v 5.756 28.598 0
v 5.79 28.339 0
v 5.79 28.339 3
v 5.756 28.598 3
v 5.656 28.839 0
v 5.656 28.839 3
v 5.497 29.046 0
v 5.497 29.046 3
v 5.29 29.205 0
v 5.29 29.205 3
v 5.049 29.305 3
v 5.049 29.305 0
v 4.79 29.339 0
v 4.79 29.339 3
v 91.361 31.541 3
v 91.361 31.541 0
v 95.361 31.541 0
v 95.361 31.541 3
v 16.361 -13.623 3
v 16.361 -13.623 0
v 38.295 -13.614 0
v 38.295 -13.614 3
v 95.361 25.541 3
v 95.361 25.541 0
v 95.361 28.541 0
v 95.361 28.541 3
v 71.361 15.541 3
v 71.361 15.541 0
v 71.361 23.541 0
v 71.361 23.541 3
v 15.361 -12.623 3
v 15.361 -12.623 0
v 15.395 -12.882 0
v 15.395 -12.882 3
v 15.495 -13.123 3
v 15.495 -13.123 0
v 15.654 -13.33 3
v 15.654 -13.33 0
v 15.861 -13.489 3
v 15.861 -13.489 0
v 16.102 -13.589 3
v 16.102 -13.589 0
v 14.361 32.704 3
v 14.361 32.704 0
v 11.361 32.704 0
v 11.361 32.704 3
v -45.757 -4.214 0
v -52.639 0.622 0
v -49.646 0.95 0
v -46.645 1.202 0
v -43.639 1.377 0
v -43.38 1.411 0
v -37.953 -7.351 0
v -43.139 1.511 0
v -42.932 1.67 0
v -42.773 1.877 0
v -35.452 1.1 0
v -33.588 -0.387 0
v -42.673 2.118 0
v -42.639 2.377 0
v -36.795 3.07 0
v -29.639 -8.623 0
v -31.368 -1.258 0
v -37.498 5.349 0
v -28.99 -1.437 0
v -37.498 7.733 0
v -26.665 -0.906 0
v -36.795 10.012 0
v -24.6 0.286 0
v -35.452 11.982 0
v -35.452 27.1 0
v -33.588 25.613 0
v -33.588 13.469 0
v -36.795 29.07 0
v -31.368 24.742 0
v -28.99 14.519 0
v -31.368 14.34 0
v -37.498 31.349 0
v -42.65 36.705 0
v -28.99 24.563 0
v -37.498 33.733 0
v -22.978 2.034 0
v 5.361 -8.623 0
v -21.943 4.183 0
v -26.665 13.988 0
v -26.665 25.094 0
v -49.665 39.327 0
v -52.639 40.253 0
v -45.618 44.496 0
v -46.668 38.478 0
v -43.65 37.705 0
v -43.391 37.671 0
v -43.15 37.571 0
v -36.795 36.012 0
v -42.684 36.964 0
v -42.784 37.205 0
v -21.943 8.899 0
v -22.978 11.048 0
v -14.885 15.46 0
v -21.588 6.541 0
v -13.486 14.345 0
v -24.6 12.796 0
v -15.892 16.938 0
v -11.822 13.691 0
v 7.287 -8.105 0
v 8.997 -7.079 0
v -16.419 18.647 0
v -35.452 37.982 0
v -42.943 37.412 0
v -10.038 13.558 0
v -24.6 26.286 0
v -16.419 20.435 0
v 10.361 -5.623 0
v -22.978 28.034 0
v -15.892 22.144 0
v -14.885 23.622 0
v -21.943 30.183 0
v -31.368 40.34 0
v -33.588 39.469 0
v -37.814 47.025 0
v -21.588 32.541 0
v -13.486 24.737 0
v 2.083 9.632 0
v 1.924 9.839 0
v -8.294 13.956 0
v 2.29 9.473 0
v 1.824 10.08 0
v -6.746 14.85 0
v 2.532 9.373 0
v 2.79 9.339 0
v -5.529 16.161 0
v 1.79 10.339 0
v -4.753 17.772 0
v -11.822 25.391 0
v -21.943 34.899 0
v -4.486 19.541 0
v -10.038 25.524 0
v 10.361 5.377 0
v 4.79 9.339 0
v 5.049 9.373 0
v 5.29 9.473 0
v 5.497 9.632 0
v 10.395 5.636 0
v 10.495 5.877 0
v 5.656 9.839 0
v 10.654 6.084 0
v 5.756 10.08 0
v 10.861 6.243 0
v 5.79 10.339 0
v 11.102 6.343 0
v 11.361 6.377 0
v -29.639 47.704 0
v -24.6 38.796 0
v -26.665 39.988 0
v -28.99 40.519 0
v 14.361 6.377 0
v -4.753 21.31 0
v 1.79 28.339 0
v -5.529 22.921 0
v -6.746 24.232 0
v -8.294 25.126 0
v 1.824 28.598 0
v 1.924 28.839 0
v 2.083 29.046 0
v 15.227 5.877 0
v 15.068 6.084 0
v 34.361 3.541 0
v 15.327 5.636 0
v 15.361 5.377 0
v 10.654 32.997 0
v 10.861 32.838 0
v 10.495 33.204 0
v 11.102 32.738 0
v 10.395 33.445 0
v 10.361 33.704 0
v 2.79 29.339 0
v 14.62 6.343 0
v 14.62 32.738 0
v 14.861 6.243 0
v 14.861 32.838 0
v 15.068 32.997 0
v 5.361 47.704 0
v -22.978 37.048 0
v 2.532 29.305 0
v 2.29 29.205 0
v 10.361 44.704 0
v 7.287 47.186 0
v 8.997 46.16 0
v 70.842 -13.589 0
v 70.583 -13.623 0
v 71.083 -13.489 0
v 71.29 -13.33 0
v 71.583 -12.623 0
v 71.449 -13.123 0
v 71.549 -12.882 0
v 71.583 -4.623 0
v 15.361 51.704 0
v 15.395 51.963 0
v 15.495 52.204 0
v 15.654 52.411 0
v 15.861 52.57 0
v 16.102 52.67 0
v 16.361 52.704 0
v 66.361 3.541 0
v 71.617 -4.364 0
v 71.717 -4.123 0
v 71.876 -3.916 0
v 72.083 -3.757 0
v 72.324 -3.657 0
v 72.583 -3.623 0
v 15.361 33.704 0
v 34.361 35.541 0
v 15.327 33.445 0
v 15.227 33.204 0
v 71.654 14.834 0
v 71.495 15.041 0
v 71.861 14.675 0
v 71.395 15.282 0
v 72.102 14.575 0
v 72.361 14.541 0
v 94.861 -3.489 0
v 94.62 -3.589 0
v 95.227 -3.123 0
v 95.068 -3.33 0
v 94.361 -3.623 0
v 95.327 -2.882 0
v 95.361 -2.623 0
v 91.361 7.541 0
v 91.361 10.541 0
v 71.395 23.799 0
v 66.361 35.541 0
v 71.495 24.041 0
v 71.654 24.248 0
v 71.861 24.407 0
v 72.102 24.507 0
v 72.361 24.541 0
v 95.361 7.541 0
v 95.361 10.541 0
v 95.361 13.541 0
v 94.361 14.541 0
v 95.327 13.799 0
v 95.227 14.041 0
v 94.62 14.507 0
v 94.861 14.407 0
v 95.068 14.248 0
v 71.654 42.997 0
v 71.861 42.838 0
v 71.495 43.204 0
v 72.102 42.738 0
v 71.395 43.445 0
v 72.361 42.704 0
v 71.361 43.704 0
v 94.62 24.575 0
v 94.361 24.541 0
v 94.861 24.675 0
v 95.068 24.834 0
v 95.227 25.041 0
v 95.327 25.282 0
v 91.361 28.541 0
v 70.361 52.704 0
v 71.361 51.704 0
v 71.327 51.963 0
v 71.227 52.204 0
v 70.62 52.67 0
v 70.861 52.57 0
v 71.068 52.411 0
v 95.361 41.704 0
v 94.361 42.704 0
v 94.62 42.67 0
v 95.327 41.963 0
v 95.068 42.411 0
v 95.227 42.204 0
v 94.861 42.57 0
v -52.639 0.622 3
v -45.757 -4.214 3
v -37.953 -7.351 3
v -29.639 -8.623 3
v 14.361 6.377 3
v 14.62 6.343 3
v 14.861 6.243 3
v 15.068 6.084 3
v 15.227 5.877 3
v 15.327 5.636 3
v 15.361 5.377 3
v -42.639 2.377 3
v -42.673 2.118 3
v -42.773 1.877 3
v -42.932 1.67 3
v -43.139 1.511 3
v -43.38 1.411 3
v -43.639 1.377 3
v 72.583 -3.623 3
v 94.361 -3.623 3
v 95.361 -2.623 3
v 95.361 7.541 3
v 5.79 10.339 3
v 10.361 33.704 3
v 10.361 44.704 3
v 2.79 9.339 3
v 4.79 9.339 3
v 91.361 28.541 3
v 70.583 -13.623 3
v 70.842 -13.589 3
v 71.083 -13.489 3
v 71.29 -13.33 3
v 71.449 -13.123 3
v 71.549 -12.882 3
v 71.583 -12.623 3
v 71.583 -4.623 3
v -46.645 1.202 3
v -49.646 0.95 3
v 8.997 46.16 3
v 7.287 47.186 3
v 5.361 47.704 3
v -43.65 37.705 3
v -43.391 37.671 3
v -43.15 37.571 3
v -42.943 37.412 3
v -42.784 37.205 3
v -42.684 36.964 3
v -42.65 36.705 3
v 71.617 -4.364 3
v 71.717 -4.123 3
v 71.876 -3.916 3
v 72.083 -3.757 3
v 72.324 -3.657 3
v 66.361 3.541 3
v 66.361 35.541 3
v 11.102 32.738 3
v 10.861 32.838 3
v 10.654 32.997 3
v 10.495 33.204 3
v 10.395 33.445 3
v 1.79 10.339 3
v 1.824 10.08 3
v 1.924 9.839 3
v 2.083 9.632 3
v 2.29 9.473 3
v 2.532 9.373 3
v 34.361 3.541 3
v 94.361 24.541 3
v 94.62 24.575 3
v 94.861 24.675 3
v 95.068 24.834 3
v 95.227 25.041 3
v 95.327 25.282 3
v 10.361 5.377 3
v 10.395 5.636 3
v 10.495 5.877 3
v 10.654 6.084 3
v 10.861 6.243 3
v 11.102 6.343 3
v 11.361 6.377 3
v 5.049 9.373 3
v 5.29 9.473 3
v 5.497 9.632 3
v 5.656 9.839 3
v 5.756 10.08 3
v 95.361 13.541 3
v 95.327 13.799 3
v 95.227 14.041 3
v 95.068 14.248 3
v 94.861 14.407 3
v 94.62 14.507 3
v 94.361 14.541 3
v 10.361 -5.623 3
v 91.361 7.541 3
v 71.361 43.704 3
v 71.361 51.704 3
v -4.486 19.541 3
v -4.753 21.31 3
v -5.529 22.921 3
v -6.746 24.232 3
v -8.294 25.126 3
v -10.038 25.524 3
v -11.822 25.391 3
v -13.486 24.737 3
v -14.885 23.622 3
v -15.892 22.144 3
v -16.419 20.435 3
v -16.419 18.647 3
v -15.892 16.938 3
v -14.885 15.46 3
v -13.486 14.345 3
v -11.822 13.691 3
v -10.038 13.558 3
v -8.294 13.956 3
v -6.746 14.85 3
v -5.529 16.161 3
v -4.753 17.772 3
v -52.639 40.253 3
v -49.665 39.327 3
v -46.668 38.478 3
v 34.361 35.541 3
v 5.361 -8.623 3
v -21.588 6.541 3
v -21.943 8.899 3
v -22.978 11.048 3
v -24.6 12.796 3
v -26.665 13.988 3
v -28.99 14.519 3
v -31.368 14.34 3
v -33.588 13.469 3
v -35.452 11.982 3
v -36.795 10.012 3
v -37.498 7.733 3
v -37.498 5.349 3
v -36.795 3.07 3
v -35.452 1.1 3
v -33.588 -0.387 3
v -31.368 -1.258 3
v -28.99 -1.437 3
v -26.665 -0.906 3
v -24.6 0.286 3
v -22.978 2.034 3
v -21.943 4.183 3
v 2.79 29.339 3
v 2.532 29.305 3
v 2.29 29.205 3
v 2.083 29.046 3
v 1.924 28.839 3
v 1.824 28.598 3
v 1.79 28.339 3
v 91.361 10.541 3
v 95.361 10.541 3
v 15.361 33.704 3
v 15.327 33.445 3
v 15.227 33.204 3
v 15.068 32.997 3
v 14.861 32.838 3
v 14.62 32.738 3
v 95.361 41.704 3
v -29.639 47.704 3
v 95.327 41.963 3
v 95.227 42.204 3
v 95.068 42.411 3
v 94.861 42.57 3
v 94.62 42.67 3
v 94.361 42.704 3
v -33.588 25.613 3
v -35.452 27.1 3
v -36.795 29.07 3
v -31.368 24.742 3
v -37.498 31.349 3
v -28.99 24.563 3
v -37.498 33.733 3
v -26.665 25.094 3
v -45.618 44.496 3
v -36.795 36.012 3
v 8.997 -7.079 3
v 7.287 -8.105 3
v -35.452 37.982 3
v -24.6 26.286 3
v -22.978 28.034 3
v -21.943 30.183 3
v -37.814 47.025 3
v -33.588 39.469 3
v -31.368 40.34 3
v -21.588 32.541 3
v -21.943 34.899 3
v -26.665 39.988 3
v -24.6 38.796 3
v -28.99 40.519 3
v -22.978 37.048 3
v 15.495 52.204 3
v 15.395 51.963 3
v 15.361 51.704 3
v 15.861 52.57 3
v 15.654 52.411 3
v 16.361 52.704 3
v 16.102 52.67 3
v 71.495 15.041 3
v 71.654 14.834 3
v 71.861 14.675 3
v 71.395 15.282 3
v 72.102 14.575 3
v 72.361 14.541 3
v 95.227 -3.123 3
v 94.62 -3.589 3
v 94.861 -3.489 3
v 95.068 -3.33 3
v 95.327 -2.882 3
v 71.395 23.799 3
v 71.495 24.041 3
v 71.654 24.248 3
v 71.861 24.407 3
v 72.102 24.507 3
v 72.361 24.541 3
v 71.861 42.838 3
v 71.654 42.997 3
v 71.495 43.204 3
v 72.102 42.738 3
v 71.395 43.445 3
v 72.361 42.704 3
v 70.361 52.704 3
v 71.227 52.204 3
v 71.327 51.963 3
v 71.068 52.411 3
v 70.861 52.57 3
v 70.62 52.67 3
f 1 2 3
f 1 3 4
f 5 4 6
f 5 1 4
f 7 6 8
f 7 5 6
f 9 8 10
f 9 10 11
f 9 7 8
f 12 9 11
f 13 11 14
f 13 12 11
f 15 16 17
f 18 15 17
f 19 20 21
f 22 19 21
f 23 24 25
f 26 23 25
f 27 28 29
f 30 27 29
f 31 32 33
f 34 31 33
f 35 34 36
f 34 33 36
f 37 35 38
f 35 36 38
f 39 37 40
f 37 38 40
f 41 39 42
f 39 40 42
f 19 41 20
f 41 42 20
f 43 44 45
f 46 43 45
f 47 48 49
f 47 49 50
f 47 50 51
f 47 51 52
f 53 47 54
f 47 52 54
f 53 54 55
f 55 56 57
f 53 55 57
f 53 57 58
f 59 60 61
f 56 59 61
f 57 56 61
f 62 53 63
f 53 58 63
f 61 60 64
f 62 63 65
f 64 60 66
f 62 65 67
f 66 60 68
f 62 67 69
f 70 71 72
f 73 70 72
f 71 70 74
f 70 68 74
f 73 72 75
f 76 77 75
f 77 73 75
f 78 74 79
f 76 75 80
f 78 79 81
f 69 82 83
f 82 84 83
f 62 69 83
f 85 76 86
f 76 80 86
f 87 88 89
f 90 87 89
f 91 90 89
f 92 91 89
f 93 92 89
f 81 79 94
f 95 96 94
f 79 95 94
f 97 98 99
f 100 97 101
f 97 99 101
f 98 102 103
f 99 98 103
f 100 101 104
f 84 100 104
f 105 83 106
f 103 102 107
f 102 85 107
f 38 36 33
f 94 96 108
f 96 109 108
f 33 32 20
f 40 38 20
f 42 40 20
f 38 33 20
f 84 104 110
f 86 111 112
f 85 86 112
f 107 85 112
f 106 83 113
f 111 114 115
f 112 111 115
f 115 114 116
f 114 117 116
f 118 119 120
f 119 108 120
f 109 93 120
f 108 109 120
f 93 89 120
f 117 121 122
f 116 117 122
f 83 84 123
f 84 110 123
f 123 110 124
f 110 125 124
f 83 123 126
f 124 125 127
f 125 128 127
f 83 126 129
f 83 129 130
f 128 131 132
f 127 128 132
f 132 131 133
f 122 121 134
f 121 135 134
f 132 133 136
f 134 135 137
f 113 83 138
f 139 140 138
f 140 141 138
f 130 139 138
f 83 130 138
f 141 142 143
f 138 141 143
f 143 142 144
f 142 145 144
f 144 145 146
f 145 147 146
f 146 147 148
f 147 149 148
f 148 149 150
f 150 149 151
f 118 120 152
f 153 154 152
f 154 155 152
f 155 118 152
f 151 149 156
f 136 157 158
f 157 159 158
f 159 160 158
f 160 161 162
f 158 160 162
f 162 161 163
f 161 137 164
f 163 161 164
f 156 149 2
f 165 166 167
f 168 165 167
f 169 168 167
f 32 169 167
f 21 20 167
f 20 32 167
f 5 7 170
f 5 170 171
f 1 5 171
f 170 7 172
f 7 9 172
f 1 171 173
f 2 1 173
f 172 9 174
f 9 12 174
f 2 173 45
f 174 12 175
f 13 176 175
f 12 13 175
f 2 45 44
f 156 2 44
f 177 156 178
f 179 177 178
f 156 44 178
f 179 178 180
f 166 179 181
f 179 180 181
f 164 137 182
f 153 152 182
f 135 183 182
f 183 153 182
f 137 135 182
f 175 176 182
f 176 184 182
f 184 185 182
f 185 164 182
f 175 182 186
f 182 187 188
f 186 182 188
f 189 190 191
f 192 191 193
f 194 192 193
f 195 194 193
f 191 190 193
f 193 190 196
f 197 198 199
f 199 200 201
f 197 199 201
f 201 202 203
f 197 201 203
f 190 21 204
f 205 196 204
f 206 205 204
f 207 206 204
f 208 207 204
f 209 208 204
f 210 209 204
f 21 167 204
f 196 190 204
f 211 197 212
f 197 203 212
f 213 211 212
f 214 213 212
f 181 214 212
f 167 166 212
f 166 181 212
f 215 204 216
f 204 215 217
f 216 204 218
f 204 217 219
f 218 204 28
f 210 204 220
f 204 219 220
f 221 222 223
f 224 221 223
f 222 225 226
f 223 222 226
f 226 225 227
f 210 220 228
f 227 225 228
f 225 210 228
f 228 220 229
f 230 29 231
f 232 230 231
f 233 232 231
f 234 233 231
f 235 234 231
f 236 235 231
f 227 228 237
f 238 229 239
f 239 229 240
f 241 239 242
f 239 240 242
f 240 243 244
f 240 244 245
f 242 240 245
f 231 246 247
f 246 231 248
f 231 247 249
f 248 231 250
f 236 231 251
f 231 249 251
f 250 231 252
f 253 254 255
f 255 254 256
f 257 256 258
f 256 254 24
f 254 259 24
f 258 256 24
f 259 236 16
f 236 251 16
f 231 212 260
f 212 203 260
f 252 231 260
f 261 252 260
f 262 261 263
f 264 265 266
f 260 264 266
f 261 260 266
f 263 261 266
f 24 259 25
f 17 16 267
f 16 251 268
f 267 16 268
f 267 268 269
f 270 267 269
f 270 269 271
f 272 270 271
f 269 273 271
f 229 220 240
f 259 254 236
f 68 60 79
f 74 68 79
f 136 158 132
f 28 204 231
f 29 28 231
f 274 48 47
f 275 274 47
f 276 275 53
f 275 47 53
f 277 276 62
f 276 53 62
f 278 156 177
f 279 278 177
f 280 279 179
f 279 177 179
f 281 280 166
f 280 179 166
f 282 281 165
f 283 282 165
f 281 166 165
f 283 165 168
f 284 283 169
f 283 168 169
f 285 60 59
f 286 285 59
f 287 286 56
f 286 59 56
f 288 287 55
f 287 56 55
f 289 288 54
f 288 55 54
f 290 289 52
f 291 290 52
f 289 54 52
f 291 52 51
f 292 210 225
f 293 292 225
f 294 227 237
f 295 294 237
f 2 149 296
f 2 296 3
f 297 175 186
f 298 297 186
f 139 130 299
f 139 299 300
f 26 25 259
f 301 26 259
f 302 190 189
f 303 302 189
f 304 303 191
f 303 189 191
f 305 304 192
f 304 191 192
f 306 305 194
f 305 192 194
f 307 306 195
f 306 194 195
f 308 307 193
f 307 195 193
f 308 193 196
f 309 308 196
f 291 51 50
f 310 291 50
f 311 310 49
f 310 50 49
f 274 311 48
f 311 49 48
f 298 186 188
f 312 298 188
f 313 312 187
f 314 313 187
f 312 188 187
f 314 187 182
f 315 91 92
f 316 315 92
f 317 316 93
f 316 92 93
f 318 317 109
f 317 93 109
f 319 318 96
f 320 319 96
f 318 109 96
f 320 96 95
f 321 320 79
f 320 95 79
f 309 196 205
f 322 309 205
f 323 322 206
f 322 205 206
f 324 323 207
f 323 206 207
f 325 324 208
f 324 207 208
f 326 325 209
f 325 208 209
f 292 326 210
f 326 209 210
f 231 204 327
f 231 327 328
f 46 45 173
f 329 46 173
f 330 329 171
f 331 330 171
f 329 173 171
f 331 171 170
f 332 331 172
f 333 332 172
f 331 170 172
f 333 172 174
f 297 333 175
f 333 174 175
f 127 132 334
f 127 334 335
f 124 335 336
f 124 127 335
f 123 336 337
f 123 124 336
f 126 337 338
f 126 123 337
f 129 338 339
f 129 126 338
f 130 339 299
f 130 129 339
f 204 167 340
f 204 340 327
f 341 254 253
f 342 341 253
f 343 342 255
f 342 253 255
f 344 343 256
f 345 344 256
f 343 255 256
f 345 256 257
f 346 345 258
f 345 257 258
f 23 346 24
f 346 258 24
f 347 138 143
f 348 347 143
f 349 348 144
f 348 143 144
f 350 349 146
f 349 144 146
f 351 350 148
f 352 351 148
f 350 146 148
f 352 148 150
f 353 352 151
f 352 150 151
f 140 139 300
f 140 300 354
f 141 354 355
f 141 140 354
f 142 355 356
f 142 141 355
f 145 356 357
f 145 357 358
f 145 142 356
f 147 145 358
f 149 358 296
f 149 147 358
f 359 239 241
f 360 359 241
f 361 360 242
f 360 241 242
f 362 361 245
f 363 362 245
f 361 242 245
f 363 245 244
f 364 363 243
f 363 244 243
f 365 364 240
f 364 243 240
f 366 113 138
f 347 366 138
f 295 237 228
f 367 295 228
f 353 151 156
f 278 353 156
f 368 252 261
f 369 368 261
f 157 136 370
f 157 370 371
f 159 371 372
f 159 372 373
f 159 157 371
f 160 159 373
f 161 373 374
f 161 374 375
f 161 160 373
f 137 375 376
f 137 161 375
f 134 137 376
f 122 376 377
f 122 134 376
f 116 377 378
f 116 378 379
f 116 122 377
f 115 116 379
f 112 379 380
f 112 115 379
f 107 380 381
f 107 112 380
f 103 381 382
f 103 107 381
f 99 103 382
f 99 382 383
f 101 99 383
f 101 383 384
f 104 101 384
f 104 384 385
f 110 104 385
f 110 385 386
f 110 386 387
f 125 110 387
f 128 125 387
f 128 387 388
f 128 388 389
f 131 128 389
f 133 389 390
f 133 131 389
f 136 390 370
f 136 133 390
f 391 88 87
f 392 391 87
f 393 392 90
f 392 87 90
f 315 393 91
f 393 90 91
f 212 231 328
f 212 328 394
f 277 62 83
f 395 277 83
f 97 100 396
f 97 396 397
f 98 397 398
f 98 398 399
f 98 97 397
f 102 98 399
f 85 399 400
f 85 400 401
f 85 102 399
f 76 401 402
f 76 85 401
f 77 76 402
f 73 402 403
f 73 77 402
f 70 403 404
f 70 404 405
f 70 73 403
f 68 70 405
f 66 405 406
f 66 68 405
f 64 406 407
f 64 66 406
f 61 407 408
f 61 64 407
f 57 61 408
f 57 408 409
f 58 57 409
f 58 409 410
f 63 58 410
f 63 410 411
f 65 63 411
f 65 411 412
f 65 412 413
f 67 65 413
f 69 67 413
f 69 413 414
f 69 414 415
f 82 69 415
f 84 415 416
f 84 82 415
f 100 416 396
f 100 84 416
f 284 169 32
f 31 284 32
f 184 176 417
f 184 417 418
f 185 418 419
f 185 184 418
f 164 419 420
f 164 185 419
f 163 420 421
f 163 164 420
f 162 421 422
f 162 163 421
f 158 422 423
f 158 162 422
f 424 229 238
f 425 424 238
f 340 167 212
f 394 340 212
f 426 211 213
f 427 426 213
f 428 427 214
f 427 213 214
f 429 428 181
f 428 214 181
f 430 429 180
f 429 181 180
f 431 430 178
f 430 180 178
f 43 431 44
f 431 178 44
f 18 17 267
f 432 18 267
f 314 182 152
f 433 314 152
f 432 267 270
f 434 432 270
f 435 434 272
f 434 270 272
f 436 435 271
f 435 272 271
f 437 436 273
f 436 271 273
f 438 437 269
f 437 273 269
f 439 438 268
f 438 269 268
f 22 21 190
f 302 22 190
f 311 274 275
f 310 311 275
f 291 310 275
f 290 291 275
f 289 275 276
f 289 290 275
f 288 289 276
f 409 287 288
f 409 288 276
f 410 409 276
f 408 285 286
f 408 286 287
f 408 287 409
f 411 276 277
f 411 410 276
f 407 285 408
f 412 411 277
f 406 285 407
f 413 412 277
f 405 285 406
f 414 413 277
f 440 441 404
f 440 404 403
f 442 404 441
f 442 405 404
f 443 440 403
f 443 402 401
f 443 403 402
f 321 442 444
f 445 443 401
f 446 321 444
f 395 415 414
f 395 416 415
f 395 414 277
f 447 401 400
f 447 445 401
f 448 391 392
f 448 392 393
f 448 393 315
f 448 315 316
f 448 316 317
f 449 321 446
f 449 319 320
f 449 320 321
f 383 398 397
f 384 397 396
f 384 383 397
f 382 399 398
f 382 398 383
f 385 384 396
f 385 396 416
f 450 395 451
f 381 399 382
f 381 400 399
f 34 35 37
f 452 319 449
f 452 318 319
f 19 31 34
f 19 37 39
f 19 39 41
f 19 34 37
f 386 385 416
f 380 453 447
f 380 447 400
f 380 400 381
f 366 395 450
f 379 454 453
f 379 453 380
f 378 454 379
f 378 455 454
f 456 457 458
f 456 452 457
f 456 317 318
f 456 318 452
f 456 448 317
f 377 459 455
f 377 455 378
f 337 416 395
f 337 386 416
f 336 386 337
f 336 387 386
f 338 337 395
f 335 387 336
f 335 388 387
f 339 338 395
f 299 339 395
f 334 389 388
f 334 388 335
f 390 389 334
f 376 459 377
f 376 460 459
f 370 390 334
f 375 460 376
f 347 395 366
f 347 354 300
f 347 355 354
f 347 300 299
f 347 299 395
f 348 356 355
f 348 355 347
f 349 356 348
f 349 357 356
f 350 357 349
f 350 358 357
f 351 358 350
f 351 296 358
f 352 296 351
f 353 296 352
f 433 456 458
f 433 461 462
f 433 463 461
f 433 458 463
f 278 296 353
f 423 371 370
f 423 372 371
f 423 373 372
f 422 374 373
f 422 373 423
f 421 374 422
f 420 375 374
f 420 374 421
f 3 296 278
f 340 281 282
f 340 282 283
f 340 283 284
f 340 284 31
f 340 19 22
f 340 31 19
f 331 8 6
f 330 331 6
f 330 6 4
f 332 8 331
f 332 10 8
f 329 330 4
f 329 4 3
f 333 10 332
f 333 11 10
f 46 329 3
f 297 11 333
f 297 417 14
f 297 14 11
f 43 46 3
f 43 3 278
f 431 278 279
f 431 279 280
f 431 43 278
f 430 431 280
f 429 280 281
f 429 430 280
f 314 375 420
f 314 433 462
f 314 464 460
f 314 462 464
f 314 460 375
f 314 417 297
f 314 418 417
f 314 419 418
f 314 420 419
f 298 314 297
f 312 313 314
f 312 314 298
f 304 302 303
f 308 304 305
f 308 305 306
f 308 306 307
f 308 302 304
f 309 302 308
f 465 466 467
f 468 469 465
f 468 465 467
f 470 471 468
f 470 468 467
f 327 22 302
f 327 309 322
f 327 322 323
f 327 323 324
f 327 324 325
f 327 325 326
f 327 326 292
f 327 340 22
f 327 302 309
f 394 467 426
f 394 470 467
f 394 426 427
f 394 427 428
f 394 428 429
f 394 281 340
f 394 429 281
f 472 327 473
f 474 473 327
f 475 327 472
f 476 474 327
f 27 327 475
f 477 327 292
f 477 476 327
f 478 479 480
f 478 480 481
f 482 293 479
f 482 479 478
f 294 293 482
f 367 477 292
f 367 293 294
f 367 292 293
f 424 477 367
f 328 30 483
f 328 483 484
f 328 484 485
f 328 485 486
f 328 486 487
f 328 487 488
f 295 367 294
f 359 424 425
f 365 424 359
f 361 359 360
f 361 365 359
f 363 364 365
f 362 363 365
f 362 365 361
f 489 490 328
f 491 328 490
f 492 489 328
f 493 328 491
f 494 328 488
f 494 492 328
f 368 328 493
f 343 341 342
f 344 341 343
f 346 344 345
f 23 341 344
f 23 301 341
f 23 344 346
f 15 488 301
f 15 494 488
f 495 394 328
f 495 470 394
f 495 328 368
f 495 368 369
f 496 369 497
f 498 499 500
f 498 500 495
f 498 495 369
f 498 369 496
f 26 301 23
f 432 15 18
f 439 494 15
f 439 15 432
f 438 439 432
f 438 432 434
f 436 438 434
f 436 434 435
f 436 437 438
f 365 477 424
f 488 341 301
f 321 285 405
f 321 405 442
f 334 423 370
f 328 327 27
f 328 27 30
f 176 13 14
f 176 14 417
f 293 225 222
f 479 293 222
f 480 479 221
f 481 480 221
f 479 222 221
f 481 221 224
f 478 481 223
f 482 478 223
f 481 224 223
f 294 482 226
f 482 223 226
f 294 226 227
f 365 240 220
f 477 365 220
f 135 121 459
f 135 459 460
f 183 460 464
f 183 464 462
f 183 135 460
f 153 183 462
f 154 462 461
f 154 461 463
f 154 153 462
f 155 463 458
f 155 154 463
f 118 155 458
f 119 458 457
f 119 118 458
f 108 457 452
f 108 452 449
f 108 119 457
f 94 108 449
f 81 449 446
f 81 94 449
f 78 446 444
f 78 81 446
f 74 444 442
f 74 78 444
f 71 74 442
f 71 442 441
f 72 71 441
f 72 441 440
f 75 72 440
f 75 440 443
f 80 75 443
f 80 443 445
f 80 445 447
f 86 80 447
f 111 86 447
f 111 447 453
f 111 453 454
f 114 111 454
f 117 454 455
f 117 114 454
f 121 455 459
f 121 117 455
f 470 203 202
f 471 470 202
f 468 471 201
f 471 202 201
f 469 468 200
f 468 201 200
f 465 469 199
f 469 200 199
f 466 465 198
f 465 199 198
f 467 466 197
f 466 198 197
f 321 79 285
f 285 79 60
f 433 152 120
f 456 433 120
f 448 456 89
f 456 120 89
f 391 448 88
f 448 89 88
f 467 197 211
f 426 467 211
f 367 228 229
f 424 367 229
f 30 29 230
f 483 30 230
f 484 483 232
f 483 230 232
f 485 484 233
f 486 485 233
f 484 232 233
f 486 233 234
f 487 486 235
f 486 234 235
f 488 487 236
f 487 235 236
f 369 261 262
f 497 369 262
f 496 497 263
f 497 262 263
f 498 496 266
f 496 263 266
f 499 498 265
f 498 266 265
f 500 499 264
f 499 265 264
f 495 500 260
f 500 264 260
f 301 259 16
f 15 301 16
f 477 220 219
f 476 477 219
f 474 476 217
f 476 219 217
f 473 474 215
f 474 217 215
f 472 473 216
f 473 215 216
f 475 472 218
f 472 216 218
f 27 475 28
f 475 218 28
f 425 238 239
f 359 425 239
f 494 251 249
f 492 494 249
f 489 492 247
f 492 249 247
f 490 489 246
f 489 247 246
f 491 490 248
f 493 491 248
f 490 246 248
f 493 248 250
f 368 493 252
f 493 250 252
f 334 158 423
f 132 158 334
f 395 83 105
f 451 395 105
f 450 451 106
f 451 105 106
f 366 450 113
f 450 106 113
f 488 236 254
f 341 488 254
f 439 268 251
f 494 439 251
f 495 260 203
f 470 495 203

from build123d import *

# Parameters (mm, degrees)
MODEL_R                 = 8
MODEL_R_2               = 6
SALIENTE_EXTRUIR1_DEPTH = 3


with BuildPart() as part:
    # Model → Saliente-Extruir1 (new body)
    with BuildSketch(Plane.XY):
        with BuildLine():
            Line((-29.638958592, -8.6229578), (5.361041408, -8.6229578))
            ThreePointArc((5.361041408, -8.6229578), (8.177920898, -7.651090282), (10.361041408, -5.6229578))
            Line((10.361041408, -5.6229578), (10.361041408, 5.3770422))
            ThreePointArc((10.361041408, 5.3770422), (10.653934627, 6.084148982), (11.361041408, 6.3770422))
            Line((11.361041408, 6.3770422), (14.361041408, 6.3770422))
            ThreePointArc((14.361041408, 6.3770422), (15.068148189, 6.084148982), (15.361041408, 5.3770422))
            Line((15.361041408, 5.3770422), (15.361041408, -12.6229578))
            ThreePointArc((15.361041408, -12.6229578), (15.653934627, -13.330064581), (16.361041408, -13.6229578))
            Line((16.361041408, -13.6229578), (38.295238995, -13.613518735))
            Line((38.295238995, -13.613518735), (70.582767323, -13.6229578))
            ThreePointArc((70.582767323, -13.6229578), (71.289874104, -13.330064581), (71.582767323, -12.6229578))
            Line((71.582767323, -12.6229578), (71.582767323, -4.6229578))
            ThreePointArc((71.582767323, -4.6229578), (71.875660542, -3.915851018), (72.582767323, -3.6229578))
            Line((72.582767323, -3.6229578), (94.361041408, -3.6229578))
            ThreePointArc((94.361041408, -3.6229578), (95.068148189, -3.330064581), (95.361041408, -2.6229578))
            Line((95.361041408, -2.6229578), (95.361041408, 7.540653568))
            Line((95.361041408, 7.540653568), (91.361041408, 7.540653568))
            Line((91.361041408, 7.540653568), (91.361041408, 10.540653568))
            Line((91.361041408, 10.540653568), (95.361041408, 10.540653568))
            Line((95.361041408, 10.540653568), (95.361041408, 13.540653568))
            ThreePointArc((95.361041408, 13.540653568), (95.068148189, 14.247760349), (94.361041408, 14.540653568))
            Line((94.361041408, 14.540653568), (72.361041408, 14.540653568))
            ThreePointArc((72.361041408, 14.540653568), (71.653934627, 14.833546787), (71.361041408, 15.540653568))
            Line((71.361041408, 15.540653568), (71.361041408, 23.540653568))
            ThreePointArc((71.361041408, 23.540653568), (71.653934627, 24.247760349), (72.361041408, 24.540653568))
            Line((72.361041408, 24.540653568), (94.361041408, 24.540653568))
            ThreePointArc((94.361041408, 24.540653568), (95.068148189, 24.833546787), (95.361041408, 25.540653568))
            Line((95.361041408, 25.540653568), (95.361041408, 28.540653568))
            Line((95.361041408, 28.540653568), (91.361041408, 28.540653568))
            Line((91.361041408, 28.540653568), (91.361041408, 31.540653568))
            Line((91.361041408, 31.540653568), (95.361041408, 31.540653568))
            Line((95.361041408, 31.540653568), (95.361041408, 41.704264936))
            ThreePointArc((95.361041408, 41.704264936), (95.068148189, 42.411371717), (94.361041408, 42.704264936))
            Line((94.361041408, 42.704264936), (72.361041408, 42.704264936))
            ThreePointArc((72.361041408, 42.704264936), (71.653934627, 42.997158154), (71.361041408, 43.704264936))
            Line((71.361041408, 43.704264936), (71.361041408, 51.704264936))
            ThreePointArc((71.361041408, 51.704264936), (71.068148189, 52.411371717), (70.361041408, 52.704264936))
            Line((70.361041408, 52.704264936), (45.361041408, 52.704264936))
            Line((45.361041408, 52.704264936), (16.361041408, 52.704264936))
            ThreePointArc((16.361041408, 52.704264936), (15.653934627, 52.411371717), (15.361041408, 51.704264936))
            Line((15.361041408, 51.704264936), (15.361041408, 33.704264936))
            ThreePointArc((15.361041408, 33.704264936), (15.068148189, 32.997158154), (14.361041408, 32.704264936))
            Line((14.361041408, 32.704264936), (11.361041408, 32.704264936))
            ThreePointArc((11.361041408, 32.704264936), (10.653934627, 32.997158154), (10.361041408, 33.704264936))
            Line((10.361041408, 33.704264936), (10.361041408, 44.704264936))
            ThreePointArc((10.361041408, 44.704264936), (8.177920898, 46.732397418), (5.361041408, 47.704264936))
            Line((5.361041408, 47.704264936), (-29.638958592, 47.704264936))
            ThreePointArc((-29.638958592, 47.704264936), (-41.789163023, 45.985500923), (-52.638958592, 40.252826715))
            ThreePointArc((-52.638958592, 40.252826715), (-48.16886463, 38.892993283), (-43.6500909, 37.704897764))
            ThreePointArc((-43.6500909, 37.704897764), (-42.942984119, 37.412004546), (-42.6500909, 36.704897764))
            Line((-42.6500909, 36.704897764), (-42.638958592, 2.3770422))
            ThreePointArc((-42.638958592, 2.3770422), (-42.931851811, 1.669935419), (-43.638958592, 1.3770422))
            ThreePointArc((-43.638958592, 1.3770422), (-48.146181418, 1.085711248), (-52.638958592, 0.622154798))
            ThreePointArc((-52.638958592, 0.622154798), (-41.945677107, -6.007356598), (-29.638958592, -8.6229578))
        make_face()
        with Locations((-29.587538582, 32.540969982)):
            Circle(MODEL_R, mode=Mode.SUBTRACT)
        with Locations((-10.486492238, 19.540969982)):
            Circle(MODEL_R_2, mode=Mode.SUBTRACT)
        with Locations((-29.587538582, 6.540969982)):
            Circle(MODEL_R, mode=Mode.SUBTRACT)
        Polygon((34.361041408, 35.540653568), (34.361041408, 20.040653568), (34.361041408, 3.540653568), (66.361041408, 3.540653568), (66.361041408, 35.540653568), align=None, mode=Mode.SUBTRACT)
        with BuildLine():
            Line((4.790372378, 29.338873837), (2.790372378, 29.338873837))
            ThreePointArc((2.790372378, 29.338873837), (2.083265597, 29.045980618), (1.790372378, 28.338873837))
            Line((1.790372378, 28.338873837), (1.790372378, 10.338873837))
            ThreePointArc((1.790372378, 10.338873837), (2.083265597, 9.631767056), (2.790372378, 9.338873837))
            Line((2.790372378, 9.338873837), (4.790372378, 9.338873837))
            ThreePointArc((4.790372378, 9.338873837), (5.49747916, 9.631767056), (5.790372378, 10.338873837))
            Line((5.790372378, 10.338873837), (5.790372378, 28.338873837))
            ThreePointArc((5.790372378, 28.338873837), (5.49747916, 29.045980618), (4.790372378, 29.338873837))
        make_face(mode=Mode.SUBTRACT)
    extrude(amount=SALIENTE_EXTRUIR1_DEPTH)


solid = part.part
